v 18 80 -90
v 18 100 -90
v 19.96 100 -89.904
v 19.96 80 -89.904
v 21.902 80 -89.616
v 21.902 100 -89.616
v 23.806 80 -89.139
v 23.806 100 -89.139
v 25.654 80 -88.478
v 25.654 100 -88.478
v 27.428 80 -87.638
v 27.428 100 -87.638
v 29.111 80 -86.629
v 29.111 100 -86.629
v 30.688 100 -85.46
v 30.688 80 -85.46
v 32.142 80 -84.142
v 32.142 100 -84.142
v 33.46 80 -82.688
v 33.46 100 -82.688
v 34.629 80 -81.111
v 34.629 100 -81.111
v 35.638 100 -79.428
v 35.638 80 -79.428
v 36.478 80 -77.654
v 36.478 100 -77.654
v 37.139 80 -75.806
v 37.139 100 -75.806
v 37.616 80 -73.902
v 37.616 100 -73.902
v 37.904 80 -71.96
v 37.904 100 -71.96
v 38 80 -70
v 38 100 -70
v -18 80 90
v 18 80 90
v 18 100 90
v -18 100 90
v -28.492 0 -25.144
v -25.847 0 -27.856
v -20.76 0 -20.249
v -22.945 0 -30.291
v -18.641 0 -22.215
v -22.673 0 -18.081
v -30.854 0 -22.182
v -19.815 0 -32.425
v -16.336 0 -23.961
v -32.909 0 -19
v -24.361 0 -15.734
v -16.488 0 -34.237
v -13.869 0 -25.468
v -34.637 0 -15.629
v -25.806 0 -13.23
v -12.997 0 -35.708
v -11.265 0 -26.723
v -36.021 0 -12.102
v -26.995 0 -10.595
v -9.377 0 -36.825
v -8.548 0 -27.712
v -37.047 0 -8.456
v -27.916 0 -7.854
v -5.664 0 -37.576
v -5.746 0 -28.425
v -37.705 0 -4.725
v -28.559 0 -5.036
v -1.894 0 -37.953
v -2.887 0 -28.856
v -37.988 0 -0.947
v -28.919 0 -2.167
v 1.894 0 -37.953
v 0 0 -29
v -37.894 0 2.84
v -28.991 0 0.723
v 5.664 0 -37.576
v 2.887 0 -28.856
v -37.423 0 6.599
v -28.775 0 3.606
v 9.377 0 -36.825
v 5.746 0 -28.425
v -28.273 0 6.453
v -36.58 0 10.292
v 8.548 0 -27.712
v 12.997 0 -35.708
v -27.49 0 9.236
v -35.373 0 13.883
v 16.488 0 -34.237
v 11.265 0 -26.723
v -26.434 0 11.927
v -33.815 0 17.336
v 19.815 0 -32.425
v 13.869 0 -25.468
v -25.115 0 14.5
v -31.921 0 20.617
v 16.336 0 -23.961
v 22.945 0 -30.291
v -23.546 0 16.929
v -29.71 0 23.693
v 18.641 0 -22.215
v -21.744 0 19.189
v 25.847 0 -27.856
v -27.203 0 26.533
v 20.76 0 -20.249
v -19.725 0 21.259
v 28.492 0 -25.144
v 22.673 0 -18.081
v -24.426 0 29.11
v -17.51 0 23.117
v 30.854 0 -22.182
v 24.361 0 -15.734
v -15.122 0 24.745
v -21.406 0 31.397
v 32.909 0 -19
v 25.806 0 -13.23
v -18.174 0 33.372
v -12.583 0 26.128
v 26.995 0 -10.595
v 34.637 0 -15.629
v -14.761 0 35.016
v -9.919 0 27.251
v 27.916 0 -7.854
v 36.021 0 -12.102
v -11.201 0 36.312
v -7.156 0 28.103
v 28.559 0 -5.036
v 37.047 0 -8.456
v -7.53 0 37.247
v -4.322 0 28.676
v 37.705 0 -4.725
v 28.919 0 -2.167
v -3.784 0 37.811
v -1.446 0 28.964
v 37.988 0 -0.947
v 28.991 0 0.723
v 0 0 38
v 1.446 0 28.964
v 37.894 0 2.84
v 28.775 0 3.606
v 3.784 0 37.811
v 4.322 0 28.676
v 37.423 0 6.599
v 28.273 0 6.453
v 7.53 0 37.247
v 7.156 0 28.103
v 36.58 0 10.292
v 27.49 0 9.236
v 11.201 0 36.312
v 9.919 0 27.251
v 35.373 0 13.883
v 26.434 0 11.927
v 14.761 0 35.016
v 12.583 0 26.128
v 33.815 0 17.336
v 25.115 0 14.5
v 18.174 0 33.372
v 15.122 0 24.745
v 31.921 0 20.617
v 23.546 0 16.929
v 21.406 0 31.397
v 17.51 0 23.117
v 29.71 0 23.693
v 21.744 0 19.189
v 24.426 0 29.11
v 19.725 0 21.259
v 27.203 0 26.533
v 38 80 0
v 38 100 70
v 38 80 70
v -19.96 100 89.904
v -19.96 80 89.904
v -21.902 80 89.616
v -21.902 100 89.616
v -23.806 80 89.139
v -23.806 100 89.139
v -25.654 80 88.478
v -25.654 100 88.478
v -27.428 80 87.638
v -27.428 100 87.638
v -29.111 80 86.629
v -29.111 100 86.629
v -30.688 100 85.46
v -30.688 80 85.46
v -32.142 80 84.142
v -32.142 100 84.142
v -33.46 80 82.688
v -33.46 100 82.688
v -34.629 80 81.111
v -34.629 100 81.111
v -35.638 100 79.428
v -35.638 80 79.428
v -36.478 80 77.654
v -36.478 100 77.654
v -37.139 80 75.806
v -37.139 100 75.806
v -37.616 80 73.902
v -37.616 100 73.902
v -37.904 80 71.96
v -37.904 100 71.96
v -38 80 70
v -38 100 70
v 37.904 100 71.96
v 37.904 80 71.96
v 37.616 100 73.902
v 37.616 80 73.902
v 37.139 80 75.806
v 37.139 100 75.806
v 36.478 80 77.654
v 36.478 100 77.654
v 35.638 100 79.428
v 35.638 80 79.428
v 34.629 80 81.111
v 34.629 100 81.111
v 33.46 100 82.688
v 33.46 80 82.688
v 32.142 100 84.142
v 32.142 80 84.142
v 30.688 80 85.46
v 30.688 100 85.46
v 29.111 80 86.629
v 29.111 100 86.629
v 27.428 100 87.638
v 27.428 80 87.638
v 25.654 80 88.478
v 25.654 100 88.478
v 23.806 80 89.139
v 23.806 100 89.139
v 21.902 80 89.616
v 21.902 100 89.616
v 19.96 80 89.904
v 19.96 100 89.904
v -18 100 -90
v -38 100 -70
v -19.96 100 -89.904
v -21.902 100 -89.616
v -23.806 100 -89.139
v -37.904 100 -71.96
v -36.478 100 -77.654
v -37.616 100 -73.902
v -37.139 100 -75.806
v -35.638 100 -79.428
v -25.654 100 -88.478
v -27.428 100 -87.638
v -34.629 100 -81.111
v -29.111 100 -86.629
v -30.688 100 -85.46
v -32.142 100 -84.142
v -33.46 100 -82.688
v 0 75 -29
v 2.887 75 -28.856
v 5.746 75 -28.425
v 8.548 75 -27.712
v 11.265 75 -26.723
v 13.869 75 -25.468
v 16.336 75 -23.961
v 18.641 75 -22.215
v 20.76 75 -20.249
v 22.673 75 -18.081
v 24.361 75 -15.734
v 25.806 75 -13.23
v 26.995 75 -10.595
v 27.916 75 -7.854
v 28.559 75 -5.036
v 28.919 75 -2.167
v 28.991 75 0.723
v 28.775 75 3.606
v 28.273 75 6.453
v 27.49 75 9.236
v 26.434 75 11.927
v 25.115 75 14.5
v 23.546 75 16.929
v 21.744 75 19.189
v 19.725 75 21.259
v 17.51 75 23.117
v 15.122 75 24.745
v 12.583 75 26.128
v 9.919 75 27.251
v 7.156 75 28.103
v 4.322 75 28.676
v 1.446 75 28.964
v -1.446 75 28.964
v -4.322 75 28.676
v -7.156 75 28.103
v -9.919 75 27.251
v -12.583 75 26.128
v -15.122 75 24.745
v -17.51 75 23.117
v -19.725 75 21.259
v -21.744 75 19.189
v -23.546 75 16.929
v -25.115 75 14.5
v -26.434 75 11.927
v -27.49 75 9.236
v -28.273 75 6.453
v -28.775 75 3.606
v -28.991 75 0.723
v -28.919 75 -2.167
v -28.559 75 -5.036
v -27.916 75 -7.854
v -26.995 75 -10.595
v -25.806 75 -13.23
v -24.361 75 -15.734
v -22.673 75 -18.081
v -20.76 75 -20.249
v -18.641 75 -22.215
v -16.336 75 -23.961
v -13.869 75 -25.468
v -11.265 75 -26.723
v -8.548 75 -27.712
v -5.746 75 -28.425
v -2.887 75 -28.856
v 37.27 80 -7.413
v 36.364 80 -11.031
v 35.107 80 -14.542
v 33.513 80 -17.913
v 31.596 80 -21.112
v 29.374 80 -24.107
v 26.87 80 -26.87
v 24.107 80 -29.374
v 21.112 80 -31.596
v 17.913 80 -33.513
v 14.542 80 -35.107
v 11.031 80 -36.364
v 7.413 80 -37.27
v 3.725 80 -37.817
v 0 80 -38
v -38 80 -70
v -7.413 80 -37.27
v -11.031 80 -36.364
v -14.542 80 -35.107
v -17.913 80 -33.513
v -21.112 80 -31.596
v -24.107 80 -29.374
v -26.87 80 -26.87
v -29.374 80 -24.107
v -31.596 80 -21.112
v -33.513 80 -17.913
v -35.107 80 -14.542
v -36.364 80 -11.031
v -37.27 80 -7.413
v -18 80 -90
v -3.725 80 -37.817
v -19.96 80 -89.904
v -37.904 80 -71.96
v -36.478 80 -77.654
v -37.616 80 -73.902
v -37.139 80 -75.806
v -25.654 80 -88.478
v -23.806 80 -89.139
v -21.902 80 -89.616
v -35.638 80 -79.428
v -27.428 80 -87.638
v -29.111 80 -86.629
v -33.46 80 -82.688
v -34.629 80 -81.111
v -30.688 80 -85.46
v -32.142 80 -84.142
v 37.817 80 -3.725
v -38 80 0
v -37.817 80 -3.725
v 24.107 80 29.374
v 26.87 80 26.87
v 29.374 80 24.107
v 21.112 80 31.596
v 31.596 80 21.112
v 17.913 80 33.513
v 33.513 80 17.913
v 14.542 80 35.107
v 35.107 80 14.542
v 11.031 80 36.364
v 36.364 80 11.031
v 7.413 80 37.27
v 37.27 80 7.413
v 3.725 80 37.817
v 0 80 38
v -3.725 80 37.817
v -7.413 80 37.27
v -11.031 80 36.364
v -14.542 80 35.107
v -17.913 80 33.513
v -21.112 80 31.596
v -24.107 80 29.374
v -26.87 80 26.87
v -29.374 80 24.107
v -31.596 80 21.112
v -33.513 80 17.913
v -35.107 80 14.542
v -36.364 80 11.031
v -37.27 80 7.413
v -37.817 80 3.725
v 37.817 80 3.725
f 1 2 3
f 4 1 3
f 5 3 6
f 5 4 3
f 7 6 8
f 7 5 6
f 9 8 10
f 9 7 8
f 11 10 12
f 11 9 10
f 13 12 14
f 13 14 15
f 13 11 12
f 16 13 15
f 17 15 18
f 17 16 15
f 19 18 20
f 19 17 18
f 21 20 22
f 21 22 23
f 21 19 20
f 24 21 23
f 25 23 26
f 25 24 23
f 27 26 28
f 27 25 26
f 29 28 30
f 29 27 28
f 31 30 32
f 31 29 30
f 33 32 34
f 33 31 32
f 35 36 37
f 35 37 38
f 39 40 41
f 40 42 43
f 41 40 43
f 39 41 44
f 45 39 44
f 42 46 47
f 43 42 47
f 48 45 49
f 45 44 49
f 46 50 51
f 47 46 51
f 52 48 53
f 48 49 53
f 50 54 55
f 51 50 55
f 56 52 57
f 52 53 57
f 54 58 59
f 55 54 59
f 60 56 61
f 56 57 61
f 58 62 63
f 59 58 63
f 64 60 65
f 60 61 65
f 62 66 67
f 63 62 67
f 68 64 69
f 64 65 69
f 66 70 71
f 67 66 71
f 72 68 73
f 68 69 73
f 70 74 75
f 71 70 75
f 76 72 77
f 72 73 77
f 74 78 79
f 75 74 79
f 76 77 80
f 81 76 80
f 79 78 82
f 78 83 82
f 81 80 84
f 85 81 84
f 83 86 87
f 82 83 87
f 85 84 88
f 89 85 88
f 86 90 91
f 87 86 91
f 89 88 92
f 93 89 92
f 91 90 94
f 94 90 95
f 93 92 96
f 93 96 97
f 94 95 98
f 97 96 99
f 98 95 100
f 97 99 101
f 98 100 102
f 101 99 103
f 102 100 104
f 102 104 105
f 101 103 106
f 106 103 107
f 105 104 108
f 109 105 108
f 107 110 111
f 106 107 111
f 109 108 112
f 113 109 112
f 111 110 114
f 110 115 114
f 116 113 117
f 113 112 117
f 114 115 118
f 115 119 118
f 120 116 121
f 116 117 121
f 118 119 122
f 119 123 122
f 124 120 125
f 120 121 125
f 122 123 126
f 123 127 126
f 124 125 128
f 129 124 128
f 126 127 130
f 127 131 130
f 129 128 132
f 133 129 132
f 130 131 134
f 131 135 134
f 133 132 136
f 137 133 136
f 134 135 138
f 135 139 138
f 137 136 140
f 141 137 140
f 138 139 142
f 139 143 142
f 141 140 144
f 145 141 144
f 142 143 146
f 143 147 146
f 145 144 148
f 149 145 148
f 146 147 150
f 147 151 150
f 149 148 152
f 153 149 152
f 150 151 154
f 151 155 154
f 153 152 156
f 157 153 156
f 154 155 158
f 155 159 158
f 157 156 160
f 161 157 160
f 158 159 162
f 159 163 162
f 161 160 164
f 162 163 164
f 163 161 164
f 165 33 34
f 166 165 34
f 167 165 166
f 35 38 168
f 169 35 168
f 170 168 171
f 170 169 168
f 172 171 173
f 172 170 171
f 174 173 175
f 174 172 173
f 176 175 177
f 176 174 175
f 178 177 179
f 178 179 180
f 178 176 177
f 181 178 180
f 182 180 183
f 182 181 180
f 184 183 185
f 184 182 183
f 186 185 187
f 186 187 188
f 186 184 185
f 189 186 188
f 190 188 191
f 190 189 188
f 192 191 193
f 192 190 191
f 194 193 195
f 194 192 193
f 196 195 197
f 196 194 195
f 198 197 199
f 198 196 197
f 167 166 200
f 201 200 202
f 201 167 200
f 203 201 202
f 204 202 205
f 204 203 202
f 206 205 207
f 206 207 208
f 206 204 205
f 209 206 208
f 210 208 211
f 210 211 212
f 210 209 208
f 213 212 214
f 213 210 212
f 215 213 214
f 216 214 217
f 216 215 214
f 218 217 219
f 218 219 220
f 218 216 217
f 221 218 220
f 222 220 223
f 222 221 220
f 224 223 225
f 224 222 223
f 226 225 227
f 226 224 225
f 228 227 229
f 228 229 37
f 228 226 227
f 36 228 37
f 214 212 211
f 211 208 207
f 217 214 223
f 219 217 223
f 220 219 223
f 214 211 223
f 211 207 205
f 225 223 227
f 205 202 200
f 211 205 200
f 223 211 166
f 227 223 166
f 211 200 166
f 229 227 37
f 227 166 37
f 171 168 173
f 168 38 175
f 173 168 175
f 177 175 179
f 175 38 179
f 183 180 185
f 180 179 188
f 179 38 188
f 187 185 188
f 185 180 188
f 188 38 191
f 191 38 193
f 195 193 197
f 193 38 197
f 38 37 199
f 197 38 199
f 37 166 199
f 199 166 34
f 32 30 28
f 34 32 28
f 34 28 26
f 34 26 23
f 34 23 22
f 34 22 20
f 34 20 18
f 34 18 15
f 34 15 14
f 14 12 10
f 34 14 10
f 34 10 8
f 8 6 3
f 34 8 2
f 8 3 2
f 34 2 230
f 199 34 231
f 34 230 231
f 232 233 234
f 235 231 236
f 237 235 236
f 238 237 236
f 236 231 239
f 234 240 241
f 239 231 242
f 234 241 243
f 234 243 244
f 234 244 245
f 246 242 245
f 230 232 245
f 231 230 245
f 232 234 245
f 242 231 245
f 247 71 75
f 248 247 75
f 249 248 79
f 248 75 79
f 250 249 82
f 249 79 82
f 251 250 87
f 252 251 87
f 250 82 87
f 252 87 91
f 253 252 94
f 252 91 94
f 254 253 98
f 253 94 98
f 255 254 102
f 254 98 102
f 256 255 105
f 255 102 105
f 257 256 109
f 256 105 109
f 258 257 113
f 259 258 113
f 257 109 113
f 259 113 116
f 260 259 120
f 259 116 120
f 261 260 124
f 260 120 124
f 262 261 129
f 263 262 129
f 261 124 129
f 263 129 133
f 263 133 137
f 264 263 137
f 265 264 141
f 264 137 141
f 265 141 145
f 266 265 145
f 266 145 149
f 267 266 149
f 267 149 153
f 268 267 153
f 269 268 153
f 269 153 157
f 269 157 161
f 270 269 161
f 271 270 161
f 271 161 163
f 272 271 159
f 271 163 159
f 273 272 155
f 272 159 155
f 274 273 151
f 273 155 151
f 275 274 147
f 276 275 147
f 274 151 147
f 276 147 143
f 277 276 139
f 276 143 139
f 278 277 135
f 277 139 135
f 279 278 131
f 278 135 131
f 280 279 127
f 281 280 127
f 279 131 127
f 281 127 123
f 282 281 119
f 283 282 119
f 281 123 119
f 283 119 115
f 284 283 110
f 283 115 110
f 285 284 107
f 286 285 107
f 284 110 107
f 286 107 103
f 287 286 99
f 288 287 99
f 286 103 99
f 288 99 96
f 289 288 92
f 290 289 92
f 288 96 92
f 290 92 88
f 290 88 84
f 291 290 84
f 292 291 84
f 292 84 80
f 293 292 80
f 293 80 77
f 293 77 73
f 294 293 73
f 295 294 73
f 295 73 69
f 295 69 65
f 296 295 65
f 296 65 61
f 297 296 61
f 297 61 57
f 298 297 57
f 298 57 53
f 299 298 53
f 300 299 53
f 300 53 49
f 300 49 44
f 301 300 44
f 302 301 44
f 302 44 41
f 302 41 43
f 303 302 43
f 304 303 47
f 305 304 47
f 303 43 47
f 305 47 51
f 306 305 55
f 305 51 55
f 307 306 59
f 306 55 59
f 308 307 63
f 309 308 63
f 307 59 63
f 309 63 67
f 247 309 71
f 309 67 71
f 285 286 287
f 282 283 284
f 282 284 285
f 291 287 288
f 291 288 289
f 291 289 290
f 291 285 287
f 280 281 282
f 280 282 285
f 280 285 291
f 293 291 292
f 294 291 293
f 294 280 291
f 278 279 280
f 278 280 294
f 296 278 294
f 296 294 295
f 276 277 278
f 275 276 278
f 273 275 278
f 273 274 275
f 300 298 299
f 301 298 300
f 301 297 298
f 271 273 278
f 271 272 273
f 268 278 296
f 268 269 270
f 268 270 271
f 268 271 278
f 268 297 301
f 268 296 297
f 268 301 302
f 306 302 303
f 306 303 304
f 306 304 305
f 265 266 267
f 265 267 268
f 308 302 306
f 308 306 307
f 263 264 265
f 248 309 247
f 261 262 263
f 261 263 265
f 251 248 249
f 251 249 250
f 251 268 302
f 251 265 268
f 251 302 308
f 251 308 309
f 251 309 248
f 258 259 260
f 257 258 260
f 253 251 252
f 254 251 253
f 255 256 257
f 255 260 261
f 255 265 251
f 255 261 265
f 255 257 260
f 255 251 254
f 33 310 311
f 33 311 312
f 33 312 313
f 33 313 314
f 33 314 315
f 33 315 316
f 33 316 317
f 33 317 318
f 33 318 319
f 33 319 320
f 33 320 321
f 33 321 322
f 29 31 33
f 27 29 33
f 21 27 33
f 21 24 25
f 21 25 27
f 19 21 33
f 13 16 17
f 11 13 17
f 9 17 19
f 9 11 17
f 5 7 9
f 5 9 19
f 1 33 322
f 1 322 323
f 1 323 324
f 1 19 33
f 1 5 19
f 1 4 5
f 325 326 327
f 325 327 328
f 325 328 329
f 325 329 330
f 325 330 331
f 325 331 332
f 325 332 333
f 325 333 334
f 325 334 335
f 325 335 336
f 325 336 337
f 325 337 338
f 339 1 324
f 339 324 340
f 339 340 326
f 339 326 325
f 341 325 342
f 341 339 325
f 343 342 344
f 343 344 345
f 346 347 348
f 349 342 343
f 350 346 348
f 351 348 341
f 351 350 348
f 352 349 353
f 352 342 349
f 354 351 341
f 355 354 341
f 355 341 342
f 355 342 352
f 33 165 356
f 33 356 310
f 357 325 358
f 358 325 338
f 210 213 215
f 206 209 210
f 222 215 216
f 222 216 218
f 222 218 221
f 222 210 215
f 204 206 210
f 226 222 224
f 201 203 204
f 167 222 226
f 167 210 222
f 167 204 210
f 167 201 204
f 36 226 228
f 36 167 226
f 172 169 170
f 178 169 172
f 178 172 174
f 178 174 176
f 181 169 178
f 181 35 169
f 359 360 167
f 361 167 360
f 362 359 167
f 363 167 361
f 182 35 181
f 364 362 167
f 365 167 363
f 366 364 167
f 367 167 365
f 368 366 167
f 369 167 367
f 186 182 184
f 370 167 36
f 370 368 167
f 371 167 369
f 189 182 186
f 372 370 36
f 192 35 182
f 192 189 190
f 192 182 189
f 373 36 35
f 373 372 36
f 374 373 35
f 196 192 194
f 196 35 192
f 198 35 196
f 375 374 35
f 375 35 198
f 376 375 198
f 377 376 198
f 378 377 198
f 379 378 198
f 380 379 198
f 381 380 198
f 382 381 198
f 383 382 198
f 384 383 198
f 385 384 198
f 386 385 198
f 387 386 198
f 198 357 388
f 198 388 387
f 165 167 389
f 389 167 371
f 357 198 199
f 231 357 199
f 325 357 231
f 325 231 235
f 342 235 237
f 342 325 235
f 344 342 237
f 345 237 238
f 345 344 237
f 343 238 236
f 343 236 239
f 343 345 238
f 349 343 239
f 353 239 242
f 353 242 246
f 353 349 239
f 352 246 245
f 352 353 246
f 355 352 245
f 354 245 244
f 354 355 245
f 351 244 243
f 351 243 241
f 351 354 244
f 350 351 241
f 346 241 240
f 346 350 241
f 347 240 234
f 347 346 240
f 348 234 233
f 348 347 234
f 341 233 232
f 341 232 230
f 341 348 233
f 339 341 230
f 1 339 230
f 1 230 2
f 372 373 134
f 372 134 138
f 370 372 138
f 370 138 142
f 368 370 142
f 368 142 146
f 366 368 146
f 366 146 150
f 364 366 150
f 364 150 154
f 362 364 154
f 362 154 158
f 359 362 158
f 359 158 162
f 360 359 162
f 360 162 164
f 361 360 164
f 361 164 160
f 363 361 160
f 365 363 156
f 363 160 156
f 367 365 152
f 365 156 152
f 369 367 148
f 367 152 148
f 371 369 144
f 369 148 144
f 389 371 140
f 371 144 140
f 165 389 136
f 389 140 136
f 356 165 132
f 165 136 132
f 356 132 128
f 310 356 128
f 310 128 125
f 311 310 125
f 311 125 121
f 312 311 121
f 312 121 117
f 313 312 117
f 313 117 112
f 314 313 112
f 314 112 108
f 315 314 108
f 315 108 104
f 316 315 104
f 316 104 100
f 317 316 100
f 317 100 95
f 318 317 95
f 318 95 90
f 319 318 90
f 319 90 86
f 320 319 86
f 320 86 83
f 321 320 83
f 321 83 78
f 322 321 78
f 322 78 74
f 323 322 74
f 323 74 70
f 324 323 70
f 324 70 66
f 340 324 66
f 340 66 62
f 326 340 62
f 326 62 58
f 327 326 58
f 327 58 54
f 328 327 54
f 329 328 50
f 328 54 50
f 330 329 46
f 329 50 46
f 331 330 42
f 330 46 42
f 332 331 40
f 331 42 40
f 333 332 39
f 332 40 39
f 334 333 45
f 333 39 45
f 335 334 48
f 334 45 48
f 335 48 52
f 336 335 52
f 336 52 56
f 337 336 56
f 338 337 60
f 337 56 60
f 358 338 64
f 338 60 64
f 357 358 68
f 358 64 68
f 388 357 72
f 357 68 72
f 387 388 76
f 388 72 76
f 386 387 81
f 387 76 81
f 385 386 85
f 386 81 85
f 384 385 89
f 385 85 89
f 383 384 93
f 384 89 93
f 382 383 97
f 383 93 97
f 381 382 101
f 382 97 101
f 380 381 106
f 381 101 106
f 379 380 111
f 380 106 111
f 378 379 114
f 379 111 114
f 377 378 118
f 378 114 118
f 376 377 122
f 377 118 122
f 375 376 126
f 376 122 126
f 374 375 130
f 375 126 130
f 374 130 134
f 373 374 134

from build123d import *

# Parameters (mm, degrees)
SKETCH1_R           = 38
BOSS_EXTRUDE1_DEPTH = 80
SKETCH2_R           = 29
CUT_EXTRUDE1_DEPTH  = 75
BOSS_EXTRUDE2_DEPTH = 20


with BuildPart() as part:
    # Sketch1 → Boss-Extrude1 (new body)
    with BuildSketch(Plane(origin=(0, 0, 0), x_dir=(1, 0, 0), z_dir=(0, 1, 0))):
        with Locations(Location((0, 0, 0), (0, 0, 270))):
            Circle(SKETCH1_R)
    extrude(amount=BOSS_EXTRUDE1_DEPTH)

    # Sketch2 → Cut-Extrude1 (cut)
    with BuildSketch(Plane.XZ):
        with Locations(Location((0, 0, 0), (0, 0, 270))):
            Circle(SKETCH2_R)
    extrude(amount=-CUT_EXTRUDE1_DEPTH, mode=Mode.SUBTRACT)

    # Sketch3 → Boss-Extrude2 (add)
    with BuildSketch(Plane(origin=(0, 80, 0), x_dir=(1, 0, 0), z_dir=(0, 1, 0))):
        with BuildLine():
            Line((18, -90), (-18, -90))
            ThreePointArc((-18, -90), (-32.142135624, -84.142135624), (-38, -70))
            Line((-38, -70), (-38, 70))
            ThreePointArc((-38, 70), (-32.142135624, 84.142135624), (-18, 90))
            Line((-18, 90), (18, 90))
            ThreePointArc((18, 90), (32.142135624, 84.142135624), (38, 70))
            Line((38, 70), (38, -70))
            ThreePointArc((38, -70), (32.142135624, -84.142135624), (18, -90))
        make_face()
    extrude(amount=BOSS_EXTRUDE2_DEPTH)


solid = part.part
